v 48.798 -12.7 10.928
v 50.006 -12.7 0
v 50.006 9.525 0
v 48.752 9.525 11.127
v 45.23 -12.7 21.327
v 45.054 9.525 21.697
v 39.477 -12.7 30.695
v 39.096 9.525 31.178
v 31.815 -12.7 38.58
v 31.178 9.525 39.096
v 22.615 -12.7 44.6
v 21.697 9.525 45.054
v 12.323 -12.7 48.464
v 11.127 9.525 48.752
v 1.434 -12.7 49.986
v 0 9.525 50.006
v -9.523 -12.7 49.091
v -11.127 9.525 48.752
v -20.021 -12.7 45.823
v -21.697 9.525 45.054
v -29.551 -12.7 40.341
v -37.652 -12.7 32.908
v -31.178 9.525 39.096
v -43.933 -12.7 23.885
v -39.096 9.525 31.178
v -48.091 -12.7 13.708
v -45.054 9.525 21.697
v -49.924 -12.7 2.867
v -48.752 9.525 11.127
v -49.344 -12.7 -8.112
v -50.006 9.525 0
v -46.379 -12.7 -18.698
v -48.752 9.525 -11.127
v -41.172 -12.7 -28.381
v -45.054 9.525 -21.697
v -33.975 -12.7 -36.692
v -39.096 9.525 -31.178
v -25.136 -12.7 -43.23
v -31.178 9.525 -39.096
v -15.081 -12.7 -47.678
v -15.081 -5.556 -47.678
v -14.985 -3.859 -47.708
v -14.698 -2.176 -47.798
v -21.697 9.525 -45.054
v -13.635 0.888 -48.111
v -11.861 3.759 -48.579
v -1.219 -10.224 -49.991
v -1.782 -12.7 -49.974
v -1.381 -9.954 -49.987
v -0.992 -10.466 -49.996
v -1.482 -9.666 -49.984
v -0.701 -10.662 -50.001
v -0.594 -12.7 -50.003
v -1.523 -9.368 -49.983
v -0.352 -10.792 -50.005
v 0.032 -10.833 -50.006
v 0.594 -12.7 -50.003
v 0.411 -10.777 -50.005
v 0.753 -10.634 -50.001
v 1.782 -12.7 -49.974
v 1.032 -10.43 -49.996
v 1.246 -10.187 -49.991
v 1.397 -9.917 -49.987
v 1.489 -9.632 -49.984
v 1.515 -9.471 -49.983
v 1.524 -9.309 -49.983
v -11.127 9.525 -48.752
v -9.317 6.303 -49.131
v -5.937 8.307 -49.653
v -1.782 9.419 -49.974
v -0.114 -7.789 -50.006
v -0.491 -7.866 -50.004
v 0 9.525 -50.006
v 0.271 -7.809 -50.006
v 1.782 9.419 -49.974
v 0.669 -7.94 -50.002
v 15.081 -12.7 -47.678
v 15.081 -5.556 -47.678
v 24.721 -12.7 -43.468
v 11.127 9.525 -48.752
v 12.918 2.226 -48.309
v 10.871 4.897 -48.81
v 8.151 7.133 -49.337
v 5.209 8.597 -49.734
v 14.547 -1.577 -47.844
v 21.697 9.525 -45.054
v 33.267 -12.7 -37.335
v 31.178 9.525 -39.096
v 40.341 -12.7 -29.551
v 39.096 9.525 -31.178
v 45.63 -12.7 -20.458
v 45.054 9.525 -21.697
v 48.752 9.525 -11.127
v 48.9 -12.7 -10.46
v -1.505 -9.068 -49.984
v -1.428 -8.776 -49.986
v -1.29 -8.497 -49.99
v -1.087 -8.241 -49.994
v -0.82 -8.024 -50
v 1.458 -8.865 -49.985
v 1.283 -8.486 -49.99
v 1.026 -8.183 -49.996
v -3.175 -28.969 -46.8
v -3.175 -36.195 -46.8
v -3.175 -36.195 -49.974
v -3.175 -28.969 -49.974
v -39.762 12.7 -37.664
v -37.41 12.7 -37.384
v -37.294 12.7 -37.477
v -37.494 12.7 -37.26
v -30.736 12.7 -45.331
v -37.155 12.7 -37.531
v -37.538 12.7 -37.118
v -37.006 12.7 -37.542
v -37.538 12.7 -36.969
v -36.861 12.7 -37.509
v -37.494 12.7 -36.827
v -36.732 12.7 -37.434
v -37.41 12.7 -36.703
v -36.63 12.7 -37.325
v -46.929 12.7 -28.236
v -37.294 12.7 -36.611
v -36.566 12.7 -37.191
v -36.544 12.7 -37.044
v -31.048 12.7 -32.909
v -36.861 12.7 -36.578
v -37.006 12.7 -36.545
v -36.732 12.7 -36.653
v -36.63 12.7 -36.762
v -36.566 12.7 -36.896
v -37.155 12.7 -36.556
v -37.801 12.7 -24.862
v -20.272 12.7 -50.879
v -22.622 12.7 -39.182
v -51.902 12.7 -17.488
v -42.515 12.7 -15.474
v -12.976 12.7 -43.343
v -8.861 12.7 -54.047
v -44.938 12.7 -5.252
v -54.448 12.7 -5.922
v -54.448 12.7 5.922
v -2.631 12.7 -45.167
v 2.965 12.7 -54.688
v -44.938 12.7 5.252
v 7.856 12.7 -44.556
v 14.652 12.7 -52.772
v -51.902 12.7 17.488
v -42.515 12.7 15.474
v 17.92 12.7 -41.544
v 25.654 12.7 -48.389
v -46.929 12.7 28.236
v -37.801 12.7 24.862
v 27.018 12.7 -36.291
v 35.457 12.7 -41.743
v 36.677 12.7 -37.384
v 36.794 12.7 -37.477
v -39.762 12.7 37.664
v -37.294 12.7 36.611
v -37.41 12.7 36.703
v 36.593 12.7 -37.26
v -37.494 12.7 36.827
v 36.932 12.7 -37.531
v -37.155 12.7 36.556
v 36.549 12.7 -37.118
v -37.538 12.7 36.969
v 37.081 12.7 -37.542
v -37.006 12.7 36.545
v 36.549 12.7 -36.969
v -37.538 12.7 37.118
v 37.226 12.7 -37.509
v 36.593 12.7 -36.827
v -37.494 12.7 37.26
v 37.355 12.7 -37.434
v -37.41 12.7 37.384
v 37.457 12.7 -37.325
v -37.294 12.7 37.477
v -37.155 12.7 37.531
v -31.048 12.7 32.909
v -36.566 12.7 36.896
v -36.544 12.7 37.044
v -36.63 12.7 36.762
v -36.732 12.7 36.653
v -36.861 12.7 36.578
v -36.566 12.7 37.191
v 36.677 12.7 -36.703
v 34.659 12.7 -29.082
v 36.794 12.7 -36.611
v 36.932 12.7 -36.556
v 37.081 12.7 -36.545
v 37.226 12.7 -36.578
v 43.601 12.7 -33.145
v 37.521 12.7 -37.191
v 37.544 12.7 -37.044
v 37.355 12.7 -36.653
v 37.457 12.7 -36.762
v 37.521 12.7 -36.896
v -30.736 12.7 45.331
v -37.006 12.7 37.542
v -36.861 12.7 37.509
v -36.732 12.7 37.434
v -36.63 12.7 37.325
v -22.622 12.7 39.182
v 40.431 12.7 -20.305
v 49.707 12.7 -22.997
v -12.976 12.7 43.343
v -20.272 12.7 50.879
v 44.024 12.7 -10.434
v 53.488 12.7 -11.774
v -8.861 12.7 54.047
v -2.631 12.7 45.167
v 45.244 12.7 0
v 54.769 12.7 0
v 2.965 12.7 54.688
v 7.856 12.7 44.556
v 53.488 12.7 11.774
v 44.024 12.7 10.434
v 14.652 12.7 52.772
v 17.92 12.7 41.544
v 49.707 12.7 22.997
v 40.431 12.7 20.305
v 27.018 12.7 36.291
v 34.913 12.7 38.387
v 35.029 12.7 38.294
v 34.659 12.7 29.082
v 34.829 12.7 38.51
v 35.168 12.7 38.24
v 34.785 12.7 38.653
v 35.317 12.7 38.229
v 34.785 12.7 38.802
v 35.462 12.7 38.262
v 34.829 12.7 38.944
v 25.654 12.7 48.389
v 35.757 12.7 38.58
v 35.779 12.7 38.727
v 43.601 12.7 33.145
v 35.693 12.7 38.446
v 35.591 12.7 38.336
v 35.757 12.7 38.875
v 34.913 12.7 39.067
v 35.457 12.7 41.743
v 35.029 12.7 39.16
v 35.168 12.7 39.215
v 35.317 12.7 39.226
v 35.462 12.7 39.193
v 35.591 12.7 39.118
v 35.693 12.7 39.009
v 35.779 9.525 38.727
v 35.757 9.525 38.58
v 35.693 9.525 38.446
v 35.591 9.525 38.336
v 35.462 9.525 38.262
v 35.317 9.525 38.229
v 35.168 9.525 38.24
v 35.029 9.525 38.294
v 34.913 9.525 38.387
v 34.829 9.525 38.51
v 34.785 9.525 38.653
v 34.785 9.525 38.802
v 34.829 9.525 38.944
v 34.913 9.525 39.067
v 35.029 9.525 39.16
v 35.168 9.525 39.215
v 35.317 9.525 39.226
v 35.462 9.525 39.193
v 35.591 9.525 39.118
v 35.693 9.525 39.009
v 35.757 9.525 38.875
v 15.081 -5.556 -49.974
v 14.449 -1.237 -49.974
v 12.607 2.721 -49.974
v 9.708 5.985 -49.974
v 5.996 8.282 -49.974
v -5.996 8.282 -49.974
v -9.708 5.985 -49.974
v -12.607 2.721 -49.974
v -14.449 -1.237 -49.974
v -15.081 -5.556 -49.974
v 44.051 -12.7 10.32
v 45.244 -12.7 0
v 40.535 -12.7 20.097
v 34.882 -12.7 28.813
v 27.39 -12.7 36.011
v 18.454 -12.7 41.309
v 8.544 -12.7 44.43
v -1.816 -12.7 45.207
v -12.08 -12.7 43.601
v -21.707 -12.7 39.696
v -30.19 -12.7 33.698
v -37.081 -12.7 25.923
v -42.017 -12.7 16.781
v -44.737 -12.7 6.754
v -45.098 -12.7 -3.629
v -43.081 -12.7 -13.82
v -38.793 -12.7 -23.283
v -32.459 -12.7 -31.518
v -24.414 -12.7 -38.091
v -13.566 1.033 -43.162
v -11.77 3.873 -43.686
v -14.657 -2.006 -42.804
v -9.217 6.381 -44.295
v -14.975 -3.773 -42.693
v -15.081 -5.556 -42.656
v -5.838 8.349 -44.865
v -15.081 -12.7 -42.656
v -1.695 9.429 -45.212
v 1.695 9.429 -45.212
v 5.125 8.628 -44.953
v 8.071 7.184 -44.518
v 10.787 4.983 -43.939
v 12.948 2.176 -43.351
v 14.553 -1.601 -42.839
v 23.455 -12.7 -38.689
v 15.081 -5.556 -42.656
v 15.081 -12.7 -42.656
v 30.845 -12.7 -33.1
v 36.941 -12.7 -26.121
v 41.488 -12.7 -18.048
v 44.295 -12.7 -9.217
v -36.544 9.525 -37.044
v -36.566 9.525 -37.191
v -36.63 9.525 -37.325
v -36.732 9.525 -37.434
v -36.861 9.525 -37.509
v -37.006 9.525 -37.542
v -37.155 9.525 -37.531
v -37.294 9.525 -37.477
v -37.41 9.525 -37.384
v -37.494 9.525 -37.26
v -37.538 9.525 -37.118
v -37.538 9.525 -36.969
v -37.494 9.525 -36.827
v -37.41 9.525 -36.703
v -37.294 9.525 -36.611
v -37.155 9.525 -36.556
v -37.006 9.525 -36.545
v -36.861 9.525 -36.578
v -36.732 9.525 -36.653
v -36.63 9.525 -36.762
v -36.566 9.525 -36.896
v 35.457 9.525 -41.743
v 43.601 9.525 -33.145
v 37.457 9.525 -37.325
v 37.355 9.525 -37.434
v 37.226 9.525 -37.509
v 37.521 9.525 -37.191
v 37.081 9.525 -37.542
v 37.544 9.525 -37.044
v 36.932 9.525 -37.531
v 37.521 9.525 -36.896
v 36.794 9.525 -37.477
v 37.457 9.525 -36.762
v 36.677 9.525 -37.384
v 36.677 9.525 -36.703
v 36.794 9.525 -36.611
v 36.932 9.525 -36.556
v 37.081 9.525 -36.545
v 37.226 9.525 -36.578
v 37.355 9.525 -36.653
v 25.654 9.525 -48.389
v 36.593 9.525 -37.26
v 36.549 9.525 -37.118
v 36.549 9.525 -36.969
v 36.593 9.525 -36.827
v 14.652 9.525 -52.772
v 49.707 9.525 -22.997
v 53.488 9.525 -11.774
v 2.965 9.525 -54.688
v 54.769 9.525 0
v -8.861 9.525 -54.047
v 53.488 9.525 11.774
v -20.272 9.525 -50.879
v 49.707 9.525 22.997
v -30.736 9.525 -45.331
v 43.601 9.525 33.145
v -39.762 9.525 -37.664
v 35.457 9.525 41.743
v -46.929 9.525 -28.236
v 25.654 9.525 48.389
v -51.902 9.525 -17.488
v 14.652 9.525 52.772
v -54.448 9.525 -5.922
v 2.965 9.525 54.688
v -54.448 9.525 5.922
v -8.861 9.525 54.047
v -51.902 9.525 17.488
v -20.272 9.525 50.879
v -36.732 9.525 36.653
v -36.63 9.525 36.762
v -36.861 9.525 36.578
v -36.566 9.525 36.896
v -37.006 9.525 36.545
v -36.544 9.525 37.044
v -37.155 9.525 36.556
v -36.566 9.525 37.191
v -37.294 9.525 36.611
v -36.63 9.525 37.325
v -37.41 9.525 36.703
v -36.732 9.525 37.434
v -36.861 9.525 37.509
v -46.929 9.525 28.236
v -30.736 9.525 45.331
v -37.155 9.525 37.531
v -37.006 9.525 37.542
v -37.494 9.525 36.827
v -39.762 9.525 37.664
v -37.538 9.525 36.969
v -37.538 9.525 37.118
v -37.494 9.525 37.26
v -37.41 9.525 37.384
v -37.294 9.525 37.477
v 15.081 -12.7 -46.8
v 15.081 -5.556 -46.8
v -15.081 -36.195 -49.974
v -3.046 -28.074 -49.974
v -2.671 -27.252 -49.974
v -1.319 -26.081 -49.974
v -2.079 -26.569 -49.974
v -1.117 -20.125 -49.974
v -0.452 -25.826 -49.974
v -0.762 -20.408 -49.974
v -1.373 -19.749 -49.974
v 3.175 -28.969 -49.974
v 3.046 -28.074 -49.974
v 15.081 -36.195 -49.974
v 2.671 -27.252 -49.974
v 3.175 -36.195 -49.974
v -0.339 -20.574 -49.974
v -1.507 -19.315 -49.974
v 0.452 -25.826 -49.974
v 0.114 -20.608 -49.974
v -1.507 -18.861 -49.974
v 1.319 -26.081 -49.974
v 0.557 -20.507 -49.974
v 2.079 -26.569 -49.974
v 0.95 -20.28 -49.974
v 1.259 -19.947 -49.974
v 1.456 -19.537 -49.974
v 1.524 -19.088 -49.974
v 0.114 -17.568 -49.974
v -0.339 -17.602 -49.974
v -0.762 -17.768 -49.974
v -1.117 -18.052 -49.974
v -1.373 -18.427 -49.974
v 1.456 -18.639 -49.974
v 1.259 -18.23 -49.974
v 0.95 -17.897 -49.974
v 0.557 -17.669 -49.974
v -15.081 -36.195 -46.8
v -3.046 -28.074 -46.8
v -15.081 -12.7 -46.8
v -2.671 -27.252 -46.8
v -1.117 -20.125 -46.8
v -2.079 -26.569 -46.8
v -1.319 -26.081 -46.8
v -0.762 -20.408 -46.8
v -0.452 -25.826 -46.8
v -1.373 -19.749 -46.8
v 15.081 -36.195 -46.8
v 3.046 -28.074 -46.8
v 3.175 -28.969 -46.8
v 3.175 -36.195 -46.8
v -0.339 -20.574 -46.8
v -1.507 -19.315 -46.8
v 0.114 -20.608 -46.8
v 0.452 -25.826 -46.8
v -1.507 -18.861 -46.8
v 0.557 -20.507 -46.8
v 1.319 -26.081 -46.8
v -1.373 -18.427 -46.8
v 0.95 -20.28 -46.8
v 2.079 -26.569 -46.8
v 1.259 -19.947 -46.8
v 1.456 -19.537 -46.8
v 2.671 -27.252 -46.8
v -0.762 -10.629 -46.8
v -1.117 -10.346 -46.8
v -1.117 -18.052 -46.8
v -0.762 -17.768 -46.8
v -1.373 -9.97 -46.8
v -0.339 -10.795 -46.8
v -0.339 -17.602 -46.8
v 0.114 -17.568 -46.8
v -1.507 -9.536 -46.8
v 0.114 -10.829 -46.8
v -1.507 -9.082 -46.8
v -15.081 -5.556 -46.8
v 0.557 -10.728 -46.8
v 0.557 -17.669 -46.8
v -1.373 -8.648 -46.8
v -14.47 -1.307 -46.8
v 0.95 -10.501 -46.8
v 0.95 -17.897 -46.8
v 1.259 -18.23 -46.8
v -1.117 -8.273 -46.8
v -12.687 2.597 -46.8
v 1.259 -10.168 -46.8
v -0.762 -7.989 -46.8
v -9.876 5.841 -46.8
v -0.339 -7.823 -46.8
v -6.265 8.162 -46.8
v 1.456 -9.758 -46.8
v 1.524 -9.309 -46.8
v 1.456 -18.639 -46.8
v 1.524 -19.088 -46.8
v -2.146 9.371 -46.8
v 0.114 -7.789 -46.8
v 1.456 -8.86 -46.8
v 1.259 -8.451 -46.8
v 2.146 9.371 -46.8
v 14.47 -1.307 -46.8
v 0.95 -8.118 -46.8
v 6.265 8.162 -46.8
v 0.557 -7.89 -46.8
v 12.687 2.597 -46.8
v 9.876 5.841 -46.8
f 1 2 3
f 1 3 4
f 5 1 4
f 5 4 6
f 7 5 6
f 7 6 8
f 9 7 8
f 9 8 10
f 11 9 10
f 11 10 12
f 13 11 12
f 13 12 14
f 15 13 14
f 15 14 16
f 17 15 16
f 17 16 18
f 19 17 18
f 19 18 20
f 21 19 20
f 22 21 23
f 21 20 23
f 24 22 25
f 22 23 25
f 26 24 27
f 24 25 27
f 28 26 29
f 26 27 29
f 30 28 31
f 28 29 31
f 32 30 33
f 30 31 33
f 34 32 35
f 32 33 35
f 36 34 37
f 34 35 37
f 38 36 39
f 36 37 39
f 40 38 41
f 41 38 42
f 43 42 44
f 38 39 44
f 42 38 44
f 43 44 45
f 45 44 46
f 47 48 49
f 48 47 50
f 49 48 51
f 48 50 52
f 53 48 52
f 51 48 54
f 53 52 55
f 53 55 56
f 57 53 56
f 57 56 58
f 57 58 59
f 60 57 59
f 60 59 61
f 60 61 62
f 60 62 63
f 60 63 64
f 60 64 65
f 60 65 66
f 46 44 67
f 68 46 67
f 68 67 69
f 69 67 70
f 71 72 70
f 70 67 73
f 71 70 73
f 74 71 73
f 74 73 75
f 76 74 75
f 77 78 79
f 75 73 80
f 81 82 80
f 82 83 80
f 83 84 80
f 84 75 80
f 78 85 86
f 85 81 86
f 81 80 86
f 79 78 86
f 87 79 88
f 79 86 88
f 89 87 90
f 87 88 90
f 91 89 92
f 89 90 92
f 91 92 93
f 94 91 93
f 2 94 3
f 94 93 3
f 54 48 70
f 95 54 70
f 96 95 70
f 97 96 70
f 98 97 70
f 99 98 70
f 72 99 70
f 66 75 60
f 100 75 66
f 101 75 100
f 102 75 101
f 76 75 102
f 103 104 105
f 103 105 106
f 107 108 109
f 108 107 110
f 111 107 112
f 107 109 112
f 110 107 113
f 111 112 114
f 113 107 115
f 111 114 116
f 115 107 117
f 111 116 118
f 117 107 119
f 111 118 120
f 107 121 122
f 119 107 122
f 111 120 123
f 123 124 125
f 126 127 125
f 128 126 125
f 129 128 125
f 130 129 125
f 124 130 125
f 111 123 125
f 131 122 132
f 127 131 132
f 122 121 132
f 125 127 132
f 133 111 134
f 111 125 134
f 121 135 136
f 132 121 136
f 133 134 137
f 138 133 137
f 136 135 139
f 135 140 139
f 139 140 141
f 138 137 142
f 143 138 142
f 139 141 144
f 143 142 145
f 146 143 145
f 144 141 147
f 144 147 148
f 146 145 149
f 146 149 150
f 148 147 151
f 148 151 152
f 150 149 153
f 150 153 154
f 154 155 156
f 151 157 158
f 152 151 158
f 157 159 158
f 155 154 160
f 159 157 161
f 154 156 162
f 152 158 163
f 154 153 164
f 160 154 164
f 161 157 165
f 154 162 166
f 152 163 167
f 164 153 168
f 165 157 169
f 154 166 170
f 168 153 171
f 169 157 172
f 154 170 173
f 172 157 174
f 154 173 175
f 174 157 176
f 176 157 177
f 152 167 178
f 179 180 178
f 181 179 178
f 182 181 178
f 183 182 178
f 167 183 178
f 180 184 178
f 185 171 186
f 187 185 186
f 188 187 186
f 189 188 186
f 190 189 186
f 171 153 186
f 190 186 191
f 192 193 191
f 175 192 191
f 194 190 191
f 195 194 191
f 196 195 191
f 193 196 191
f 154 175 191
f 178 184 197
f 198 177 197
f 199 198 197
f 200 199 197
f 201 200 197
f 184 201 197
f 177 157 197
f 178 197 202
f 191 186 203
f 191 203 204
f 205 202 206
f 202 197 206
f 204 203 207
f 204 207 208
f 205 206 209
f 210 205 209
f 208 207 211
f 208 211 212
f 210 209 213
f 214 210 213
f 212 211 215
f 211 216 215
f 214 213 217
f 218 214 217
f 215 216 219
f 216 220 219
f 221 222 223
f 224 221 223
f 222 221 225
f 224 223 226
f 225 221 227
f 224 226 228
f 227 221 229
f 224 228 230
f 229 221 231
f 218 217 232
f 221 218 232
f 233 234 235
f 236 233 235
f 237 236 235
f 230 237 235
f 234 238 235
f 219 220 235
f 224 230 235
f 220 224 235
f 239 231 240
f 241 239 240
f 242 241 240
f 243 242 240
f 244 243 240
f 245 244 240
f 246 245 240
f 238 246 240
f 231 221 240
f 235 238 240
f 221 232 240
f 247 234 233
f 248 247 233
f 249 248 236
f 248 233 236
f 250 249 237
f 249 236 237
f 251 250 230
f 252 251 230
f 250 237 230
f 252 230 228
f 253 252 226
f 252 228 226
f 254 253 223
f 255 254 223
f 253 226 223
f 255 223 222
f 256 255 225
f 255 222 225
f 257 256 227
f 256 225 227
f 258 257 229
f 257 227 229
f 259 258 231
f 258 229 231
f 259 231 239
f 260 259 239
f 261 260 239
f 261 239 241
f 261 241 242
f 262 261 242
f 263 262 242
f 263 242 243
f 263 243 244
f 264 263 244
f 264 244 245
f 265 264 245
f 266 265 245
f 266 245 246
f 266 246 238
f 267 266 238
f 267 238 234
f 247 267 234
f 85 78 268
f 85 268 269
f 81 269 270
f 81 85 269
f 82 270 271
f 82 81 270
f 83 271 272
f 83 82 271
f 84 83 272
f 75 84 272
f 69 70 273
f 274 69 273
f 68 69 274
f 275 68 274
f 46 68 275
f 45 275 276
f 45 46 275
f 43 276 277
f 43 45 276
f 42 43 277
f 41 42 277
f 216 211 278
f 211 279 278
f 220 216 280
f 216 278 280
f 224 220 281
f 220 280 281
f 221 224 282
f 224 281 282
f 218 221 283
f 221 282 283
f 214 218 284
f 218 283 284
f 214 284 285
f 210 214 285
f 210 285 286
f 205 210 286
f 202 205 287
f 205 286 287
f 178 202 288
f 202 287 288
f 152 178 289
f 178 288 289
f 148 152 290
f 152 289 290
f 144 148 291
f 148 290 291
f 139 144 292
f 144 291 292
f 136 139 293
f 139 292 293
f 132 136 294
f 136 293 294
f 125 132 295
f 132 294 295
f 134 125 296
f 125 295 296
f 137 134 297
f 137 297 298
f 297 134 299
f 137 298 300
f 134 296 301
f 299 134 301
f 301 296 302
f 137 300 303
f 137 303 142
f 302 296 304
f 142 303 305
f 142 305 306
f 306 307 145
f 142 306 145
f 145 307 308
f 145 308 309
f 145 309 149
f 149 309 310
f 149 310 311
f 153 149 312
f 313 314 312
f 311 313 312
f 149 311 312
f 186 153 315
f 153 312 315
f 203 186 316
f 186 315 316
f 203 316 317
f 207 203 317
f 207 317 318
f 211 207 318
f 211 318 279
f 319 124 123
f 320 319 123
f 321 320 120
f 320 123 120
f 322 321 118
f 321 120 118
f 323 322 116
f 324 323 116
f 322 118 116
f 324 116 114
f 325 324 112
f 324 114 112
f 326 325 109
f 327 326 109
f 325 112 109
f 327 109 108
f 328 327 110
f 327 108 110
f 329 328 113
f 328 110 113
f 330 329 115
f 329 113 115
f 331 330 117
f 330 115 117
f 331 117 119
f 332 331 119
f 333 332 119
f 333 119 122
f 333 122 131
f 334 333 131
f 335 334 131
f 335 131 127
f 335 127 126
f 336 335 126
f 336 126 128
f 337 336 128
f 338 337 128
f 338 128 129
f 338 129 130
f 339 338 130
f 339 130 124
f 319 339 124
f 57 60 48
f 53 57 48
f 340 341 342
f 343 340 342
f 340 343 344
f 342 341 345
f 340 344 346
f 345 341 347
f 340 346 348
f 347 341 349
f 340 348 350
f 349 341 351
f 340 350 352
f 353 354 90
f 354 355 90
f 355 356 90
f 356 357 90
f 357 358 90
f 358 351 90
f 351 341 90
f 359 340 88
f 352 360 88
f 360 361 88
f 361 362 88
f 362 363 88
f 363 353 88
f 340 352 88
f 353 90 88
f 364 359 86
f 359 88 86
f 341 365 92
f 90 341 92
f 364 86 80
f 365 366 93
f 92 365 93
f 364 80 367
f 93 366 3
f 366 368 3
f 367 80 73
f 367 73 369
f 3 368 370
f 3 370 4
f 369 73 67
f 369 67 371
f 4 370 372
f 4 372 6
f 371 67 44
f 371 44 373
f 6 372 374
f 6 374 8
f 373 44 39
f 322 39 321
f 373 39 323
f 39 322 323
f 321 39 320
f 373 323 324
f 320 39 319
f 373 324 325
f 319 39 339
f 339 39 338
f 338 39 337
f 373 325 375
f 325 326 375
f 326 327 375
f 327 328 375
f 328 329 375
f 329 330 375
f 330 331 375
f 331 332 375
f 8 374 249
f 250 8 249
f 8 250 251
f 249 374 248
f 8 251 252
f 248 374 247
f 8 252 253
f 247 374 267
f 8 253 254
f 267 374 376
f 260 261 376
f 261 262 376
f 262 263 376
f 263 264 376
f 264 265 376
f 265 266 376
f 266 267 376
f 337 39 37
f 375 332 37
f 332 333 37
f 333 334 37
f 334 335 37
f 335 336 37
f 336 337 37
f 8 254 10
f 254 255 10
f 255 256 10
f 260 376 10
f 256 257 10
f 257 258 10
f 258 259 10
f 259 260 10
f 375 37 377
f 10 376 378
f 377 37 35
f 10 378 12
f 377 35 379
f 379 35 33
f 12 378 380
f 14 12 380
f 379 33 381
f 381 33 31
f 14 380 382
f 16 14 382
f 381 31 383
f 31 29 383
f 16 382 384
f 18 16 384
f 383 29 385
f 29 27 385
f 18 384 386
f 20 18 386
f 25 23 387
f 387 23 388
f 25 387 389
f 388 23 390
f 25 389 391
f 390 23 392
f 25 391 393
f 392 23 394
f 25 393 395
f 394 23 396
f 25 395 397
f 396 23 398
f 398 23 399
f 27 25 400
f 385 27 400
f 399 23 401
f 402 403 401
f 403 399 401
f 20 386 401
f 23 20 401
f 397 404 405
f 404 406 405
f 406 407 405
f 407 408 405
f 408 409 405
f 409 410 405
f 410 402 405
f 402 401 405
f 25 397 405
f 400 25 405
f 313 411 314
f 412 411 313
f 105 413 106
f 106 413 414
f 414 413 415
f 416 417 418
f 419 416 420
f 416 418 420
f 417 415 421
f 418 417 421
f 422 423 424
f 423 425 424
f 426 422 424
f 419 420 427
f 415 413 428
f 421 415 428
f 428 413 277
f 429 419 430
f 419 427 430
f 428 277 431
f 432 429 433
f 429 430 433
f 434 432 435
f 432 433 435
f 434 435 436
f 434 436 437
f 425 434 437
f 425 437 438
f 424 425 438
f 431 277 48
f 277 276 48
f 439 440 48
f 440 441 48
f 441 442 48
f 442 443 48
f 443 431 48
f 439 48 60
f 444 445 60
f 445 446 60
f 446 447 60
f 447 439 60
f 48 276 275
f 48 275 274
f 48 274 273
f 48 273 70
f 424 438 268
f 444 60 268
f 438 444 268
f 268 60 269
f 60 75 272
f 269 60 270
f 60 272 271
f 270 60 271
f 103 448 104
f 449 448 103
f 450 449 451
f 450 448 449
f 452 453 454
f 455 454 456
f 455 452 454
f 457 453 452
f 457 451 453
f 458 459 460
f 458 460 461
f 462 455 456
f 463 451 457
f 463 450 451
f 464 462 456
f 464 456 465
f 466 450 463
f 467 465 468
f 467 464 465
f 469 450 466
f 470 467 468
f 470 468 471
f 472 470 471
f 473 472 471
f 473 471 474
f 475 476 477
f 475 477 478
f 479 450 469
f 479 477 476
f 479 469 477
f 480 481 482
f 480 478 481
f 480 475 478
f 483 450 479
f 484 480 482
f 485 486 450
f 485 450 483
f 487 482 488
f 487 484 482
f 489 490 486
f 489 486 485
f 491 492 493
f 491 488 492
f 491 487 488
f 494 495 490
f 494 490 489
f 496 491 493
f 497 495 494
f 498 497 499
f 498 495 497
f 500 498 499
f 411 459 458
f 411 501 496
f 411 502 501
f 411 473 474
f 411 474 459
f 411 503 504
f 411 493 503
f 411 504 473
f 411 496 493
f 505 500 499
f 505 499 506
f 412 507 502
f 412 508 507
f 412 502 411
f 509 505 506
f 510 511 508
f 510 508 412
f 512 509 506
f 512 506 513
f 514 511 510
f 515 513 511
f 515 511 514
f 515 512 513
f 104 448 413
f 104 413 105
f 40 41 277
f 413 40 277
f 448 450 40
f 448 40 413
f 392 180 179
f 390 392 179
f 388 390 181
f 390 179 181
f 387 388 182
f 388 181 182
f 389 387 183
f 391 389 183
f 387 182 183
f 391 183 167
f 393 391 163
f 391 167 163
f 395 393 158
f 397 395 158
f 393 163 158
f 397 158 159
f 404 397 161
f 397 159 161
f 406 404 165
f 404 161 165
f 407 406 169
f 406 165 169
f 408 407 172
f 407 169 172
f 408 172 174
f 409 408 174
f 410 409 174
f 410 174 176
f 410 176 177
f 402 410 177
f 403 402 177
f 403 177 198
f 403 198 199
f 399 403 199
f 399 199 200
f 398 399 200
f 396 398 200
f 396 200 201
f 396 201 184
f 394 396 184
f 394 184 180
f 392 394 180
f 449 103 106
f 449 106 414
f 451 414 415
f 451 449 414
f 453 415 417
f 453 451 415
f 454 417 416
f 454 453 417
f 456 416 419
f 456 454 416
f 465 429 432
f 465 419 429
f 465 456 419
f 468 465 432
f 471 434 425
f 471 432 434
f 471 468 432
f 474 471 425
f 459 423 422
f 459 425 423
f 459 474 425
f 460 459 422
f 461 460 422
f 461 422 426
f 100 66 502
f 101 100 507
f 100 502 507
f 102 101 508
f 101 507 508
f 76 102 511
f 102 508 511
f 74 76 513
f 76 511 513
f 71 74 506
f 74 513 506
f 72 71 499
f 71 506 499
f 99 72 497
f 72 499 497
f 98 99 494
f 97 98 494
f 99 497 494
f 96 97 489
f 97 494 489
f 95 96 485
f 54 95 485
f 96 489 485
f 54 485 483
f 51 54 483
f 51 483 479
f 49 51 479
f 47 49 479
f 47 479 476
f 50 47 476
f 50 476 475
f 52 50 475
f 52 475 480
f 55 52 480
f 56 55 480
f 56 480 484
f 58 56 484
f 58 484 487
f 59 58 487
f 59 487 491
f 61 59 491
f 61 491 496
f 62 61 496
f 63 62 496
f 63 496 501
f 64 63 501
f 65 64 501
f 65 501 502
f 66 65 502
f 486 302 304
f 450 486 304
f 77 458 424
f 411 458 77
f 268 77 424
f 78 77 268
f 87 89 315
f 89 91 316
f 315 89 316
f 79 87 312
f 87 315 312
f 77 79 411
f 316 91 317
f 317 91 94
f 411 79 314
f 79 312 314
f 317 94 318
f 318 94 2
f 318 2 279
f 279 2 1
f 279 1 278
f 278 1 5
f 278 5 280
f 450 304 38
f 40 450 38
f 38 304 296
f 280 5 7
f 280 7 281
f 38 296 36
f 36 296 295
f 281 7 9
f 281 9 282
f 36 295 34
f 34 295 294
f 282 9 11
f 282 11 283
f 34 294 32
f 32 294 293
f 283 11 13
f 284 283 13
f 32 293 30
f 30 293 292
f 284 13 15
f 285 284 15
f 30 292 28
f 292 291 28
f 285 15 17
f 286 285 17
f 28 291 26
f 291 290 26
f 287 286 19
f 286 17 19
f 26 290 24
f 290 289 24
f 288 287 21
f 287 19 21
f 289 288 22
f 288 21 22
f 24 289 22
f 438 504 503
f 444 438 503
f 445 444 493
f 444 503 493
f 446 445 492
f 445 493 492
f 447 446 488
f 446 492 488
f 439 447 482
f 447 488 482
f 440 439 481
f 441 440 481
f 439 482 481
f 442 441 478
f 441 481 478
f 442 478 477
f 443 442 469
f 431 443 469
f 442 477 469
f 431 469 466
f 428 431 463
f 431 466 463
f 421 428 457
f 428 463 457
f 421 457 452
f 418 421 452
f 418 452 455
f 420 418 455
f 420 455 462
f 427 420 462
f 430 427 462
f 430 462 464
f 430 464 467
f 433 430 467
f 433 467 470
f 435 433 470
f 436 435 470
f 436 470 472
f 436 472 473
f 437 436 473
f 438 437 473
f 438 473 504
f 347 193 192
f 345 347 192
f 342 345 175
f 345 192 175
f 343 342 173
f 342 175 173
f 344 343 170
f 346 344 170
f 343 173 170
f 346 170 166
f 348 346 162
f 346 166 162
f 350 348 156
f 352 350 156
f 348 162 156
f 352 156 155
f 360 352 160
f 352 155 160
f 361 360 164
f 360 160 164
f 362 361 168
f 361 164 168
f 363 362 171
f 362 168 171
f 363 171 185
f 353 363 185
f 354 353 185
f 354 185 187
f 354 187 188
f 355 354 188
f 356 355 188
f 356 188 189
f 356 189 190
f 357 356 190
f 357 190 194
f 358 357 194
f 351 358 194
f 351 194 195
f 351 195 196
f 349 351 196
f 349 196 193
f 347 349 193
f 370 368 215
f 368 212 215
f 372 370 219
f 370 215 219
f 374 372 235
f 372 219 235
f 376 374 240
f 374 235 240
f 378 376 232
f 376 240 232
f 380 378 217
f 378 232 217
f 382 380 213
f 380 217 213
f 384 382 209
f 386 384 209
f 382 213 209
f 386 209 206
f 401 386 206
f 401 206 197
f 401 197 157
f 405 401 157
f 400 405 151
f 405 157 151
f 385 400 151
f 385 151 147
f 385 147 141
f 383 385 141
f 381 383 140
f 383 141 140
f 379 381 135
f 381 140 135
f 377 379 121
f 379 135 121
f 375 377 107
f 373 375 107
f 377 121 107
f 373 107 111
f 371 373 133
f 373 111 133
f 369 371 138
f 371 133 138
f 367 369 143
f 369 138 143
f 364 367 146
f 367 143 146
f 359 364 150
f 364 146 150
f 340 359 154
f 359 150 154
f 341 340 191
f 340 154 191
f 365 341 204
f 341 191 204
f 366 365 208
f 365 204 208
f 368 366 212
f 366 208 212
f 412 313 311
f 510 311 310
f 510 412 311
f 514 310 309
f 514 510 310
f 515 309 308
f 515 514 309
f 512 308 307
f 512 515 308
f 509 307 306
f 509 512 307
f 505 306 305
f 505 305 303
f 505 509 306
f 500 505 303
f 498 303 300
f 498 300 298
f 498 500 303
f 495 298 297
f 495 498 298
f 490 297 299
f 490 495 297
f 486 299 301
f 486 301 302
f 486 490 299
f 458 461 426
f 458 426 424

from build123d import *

# Parameters (mm, degrees)
CUT_EXTRUDE1_START        = -45.212
CUT_EXTRUDE1_DEPTH        = 3.302
CUT_EXTRUDE1_DEPTH_BACK   = 1.5875
SKETCH4_W                 = 30.1625
SKETCH4_H                 = 23.495
BOSS_EXTRUDE1_DEPTH       = 3.175
SKETCH5_R                 = 1.524
CUT_EXTRUDE2_DEPTH        = 8.96925
F_1_0MM_DOWEL_HOLE1_D     = 1
F_1_0MM_DOWEL_HOLE1_DEPTH = 3.175


with BuildPart() as part:
    # Sketch2 → Revolve1 (revolve)
    with BuildSketch(Plane.XY):
        Polygon((45.24375, -12.7), (50.00625, -12.7), (50.00625, 9.525), (54.76875, 9.525), (54.76875, 12.7), (50.00625, 12.7), (45.24375, 12.7), align=None)
    revolve(axis=Axis((0, 12.7, 0), (0, -1, 0)))

    # Sketch3 → Cut-Extrude1 (cut, two sides)
    with BuildSketch(Plane.XY.offset(CUT_EXTRUDE1_START)) as cut_extrude1_sk:
        with BuildLine():
            Line((-15.08125, -12.7), (15.08125, -12.7))
            Line((15.08125, -12.7), (15.08125, -5.55625))
            ThreePointArc((15.08125, -5.55625), (0, 9.525), (-15.08125, -5.55625))
            Line((-15.08125, -5.55625), (-15.08125, -12.7))
        make_face()
    extrude(amount=CUT_EXTRUDE1_DEPTH, mode=Mode.SUBTRACT)
    extrude(cut_extrude1_sk.sketch, amount=-CUT_EXTRUDE1_DEPTH_BACK, mode=Mode.SUBTRACT)

    # Sketch4 → Boss-Extrude1 (add)
    with BuildSketch(Plane.XY.offset(-46.7995)):
        with BuildLine():
            ThreePointArc((15.08125, -5.55625), (0, 9.525), (-15.08125, -5.55625))
            Line((-15.08125, -5.55625), (-15.08125, -12.7))
            Line((-15.08125, -12.7), (15.08125, -12.7))
            Line((15.08125, -12.7), (15.08125, -5.55625))
        make_face()
        with Locations((0, -24.4475)):
            Rectangle(SKETCH4_W, SKETCH4_H)
    extrude(amount=-BOSS_EXTRUDE1_DEPTH)

    # Sketch5 → Cut-Extrude2 (cut, through all)
    with BuildSketch(Plane.XY.offset(-46.7995)):
        with Locations((0, -19.0881)):
            Circle(SKETCH5_R)
        with Locations((0, -9.3091)):
            Circle(SKETCH5_R)
        with BuildLine():
            Line((-3.175, -36.195), (-3.175, -28.9687))
            ThreePointArc((-3.175, -28.9687), (0, -25.7937), (3.175, -28.9687))
            Line((3.175, -28.9687), (3.175, -36.195))
            Line((3.175, -36.195), (-3.175, -36.195))
        make_face()
    extrude(amount=-CUT_EXTRUDE2_DEPTH, mode=Mode.SUBTRACT)

    # Ø1.0mm Dowel Hole1
    with Locations(Plane(origin=(0, 9.525, 0), x_dir=(-1, 0, 0), z_dir=(0, -1, 0))):
        with Locations((-35.279486504, -38.727354522), (-37.043556499, 37.043556499), (37.043556499, 37.043556499), (37.043556499, -37.043556499)):
            Hole(F_1_0MM_DOWEL_HOLE1_D / 2, depth=F_1_0MM_DOWEL_HOLE1_DEPTH)


solid = part.part
